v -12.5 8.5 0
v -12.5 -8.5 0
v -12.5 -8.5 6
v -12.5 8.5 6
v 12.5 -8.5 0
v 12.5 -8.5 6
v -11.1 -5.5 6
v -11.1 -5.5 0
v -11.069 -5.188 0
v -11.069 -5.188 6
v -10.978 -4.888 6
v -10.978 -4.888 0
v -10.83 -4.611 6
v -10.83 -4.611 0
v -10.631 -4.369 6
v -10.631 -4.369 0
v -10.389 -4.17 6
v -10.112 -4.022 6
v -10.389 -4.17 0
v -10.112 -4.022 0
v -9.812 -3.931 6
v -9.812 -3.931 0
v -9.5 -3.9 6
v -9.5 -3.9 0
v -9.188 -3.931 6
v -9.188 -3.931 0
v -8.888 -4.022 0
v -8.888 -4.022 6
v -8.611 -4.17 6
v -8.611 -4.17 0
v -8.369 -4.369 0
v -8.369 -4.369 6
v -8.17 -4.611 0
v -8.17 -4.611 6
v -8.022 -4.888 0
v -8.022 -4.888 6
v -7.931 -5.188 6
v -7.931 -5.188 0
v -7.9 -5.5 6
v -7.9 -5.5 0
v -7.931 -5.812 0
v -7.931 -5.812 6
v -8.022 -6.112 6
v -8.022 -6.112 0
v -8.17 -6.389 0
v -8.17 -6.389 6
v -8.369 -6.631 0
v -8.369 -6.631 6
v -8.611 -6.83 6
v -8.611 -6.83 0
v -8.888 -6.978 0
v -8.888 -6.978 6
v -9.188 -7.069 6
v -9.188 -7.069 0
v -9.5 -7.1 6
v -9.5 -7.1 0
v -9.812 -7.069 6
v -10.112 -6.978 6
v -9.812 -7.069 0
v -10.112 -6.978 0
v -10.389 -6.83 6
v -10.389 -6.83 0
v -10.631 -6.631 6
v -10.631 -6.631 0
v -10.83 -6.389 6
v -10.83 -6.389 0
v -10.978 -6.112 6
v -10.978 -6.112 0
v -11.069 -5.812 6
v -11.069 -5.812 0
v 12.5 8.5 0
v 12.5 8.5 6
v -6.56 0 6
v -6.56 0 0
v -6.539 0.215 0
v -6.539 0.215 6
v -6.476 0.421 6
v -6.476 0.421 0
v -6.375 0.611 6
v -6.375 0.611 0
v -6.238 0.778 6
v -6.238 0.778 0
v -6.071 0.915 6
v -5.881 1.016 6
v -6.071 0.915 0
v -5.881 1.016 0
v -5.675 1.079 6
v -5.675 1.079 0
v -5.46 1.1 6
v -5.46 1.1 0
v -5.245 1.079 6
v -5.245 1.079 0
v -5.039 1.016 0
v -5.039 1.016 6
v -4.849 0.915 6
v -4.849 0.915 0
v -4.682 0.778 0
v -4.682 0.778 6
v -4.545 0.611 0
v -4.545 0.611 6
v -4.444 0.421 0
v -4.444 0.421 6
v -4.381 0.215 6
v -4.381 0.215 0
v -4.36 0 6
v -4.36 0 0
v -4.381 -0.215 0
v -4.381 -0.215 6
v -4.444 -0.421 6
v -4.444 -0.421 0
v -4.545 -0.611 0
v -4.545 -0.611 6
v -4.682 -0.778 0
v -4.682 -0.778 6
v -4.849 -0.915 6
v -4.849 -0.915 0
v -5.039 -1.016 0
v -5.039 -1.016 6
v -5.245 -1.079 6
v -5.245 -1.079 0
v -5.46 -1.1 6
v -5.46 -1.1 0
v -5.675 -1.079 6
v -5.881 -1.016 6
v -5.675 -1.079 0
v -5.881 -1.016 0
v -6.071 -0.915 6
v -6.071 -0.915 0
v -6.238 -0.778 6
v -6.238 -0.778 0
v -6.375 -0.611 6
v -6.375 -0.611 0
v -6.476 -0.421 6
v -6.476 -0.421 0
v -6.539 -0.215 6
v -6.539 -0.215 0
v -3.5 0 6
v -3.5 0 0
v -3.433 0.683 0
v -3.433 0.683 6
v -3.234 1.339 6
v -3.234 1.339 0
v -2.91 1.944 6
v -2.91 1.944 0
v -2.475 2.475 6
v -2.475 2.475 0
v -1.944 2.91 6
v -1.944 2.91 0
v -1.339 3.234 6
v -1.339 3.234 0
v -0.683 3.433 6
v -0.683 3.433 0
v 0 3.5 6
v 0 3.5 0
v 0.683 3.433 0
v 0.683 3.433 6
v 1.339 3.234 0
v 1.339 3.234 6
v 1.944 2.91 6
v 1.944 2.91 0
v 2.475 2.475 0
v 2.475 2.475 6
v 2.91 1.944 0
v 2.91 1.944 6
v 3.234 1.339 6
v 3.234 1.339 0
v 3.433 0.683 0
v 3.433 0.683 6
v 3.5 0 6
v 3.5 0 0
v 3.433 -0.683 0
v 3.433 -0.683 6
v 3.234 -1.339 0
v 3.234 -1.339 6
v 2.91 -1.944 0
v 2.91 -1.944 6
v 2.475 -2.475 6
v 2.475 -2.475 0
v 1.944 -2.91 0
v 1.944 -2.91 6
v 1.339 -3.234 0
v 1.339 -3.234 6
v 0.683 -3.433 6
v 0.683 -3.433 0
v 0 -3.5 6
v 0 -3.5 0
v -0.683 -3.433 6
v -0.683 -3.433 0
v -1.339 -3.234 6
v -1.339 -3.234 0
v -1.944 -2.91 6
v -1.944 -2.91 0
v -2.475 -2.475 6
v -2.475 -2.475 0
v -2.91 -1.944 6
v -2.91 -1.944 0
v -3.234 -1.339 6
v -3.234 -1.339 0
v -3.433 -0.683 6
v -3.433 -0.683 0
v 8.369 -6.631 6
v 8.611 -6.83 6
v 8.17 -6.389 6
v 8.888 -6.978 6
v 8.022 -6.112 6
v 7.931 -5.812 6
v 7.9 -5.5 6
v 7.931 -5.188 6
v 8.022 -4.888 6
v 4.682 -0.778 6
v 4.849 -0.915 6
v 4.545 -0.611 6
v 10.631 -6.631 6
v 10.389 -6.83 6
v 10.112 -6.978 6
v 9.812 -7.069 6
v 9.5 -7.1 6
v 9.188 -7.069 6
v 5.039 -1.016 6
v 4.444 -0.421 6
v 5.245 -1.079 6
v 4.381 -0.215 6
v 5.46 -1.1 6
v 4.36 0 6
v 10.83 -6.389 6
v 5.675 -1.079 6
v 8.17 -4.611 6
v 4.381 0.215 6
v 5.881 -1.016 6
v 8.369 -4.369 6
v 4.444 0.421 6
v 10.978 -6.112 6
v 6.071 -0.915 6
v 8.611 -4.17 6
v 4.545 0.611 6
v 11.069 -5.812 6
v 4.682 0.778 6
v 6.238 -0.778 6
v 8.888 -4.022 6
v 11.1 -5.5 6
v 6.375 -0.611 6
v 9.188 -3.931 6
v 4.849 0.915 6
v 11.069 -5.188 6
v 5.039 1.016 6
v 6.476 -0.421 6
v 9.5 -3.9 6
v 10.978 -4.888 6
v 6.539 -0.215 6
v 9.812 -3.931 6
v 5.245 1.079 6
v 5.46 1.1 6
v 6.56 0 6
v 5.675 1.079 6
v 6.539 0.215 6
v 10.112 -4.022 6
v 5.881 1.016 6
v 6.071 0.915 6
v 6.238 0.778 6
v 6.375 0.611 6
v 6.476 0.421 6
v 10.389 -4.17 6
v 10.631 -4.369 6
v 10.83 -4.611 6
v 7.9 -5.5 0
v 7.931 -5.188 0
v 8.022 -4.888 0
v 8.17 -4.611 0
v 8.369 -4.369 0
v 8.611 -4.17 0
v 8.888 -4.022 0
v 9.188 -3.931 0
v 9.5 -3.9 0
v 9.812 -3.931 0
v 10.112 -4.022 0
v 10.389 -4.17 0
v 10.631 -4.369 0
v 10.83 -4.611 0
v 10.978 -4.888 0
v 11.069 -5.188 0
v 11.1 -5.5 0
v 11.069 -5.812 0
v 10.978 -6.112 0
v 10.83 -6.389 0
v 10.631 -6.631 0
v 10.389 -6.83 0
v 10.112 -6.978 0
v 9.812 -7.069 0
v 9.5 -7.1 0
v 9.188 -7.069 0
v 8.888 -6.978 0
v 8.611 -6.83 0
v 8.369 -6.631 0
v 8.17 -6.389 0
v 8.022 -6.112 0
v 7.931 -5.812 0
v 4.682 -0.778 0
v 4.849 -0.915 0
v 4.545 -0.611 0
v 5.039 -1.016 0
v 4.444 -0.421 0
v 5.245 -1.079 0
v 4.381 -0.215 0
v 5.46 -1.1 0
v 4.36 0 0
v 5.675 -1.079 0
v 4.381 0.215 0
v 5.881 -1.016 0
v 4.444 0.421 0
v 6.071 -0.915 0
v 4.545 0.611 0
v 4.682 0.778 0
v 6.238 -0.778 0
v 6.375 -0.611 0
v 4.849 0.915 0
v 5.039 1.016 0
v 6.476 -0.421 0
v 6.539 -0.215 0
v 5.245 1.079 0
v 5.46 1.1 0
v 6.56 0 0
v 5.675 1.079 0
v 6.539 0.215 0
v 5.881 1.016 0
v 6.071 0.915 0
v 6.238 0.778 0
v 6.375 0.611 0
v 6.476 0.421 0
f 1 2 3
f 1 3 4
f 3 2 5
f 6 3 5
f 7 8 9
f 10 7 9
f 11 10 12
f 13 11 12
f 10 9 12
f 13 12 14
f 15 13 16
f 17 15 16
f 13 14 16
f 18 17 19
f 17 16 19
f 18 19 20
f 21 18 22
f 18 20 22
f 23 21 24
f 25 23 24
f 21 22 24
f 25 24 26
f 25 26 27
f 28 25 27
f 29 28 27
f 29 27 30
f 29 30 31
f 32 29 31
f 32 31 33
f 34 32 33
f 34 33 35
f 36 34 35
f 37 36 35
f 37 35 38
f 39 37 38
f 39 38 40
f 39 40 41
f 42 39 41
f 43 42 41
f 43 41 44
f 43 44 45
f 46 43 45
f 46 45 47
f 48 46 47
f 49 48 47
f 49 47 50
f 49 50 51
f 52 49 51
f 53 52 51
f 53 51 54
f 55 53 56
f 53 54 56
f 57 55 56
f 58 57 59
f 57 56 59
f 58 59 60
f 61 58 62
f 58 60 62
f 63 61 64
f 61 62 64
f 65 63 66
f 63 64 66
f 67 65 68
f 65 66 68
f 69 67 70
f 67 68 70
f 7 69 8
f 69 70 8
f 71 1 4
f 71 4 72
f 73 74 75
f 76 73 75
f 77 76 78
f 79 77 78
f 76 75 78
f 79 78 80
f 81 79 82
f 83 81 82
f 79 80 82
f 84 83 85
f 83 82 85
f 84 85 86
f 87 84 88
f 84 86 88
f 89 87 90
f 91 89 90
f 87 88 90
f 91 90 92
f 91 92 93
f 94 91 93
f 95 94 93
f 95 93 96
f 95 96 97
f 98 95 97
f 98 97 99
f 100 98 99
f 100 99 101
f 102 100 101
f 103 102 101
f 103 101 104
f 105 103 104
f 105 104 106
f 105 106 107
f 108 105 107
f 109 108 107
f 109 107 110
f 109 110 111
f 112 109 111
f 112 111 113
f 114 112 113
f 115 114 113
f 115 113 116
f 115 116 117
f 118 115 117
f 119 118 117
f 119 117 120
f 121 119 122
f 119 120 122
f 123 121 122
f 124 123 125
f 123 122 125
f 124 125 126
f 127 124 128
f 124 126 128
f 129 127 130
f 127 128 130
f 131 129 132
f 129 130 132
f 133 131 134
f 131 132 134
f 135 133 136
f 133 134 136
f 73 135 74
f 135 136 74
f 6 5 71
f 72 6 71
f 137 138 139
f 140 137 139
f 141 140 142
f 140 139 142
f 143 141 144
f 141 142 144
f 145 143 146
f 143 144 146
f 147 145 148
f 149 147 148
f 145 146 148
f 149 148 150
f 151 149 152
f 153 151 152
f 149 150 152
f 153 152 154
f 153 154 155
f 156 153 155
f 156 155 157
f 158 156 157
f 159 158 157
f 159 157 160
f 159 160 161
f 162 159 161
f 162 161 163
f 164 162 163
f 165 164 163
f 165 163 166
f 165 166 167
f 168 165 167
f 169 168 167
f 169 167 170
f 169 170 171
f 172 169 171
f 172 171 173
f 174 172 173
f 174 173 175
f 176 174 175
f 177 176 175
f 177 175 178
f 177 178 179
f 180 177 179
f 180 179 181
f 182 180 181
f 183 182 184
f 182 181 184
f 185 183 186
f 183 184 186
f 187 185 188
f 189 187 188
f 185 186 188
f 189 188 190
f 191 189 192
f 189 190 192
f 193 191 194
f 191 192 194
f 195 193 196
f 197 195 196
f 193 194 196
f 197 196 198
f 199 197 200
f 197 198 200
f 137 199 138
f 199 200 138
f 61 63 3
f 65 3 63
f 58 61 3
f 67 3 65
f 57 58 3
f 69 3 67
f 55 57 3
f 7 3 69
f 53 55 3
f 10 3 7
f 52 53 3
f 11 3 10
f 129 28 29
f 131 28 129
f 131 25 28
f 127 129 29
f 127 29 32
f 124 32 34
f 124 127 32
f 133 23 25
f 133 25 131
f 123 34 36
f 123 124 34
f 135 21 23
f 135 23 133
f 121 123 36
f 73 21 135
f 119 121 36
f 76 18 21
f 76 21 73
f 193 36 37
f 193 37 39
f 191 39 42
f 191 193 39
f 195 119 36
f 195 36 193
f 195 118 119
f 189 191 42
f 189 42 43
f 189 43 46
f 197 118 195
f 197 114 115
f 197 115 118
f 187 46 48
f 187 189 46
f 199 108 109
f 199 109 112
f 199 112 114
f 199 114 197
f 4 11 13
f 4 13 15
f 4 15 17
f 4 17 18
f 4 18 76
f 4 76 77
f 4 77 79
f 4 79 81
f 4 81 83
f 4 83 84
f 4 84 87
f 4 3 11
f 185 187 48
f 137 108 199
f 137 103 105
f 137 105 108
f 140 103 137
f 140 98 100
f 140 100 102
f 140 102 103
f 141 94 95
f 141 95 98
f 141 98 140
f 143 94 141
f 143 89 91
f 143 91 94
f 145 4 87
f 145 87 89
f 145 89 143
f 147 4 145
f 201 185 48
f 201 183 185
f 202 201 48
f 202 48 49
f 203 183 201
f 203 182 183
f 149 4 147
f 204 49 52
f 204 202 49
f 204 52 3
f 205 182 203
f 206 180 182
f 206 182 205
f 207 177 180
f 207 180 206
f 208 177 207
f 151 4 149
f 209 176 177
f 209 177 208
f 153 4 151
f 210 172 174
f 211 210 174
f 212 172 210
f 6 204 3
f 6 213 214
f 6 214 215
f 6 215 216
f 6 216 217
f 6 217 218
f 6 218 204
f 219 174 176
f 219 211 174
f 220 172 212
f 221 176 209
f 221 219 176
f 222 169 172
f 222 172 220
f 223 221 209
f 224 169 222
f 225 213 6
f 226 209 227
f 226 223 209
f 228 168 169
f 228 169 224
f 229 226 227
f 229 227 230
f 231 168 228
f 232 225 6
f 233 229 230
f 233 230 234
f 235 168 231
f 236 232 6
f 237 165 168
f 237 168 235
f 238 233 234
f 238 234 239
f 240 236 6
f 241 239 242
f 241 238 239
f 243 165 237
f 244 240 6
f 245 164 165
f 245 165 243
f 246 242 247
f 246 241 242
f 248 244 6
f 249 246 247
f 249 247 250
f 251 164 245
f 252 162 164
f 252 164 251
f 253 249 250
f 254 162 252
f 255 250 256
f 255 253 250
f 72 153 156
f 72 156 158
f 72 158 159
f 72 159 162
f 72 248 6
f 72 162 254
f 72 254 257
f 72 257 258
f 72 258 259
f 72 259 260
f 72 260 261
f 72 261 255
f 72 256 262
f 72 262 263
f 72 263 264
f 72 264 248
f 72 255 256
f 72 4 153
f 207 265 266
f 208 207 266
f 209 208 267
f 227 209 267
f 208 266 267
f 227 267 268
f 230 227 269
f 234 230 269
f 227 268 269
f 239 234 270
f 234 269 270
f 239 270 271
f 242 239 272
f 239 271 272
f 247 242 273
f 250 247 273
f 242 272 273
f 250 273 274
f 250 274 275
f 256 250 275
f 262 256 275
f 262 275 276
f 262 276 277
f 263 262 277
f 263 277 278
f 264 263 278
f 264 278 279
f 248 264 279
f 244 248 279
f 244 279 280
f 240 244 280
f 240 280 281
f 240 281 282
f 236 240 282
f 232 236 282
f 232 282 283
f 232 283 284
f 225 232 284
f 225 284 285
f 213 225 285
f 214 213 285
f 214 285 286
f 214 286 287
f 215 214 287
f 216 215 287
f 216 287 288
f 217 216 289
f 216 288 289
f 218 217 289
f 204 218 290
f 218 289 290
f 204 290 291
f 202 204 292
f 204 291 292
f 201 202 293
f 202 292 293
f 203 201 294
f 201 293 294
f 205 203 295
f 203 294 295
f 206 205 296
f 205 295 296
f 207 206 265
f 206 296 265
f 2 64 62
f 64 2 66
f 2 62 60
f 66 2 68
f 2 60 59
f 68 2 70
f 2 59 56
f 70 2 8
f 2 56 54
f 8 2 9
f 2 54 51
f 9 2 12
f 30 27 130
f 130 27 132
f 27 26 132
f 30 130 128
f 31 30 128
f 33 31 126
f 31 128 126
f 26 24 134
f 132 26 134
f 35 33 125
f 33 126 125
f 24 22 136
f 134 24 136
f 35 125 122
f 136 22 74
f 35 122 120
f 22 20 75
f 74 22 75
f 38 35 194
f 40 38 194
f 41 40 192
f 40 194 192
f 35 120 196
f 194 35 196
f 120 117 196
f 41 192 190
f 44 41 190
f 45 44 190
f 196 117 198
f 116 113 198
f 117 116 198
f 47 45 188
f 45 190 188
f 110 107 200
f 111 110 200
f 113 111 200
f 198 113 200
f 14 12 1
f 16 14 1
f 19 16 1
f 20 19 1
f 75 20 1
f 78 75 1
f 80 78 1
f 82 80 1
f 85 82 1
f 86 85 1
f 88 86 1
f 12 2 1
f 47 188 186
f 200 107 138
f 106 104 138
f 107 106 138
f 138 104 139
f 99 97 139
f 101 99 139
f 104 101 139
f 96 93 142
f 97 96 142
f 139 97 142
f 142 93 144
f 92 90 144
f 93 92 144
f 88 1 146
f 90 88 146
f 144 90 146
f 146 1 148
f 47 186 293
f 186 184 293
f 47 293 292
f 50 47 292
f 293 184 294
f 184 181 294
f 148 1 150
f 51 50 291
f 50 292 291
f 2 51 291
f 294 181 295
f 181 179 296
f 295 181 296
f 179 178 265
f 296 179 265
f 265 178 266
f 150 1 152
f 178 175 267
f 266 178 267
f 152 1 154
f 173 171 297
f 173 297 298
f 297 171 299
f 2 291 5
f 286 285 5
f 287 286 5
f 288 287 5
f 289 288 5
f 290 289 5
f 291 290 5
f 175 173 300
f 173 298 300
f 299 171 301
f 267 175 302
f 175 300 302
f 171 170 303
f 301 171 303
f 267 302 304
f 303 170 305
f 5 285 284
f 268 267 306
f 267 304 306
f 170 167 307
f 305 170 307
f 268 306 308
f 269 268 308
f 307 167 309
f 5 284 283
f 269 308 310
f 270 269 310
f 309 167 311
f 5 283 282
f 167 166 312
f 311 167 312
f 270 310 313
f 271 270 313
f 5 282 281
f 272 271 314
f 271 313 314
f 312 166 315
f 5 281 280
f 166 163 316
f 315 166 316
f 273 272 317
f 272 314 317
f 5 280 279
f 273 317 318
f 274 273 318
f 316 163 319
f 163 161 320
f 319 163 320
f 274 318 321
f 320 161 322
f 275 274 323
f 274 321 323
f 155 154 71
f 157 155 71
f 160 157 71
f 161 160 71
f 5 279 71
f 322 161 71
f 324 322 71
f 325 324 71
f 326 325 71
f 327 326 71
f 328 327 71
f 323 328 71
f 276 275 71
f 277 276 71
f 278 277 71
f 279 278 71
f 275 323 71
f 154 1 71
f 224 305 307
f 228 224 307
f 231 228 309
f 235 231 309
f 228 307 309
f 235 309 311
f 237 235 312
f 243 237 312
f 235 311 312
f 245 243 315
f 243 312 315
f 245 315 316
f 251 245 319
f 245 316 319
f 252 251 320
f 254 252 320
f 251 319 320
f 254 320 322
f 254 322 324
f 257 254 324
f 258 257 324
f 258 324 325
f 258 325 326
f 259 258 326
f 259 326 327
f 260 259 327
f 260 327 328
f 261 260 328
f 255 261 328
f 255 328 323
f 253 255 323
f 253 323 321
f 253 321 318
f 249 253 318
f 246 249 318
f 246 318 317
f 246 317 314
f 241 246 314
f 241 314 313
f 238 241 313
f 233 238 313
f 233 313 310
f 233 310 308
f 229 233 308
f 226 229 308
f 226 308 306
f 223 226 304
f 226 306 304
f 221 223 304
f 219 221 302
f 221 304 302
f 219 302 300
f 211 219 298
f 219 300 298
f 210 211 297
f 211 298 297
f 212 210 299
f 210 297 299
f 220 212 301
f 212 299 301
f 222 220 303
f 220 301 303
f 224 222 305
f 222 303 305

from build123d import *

# Parameters (mm, degrees)
SKIZZE1_W                        = 25
SKIZZE1_H                        = 17
AUFSATZ_LINEAR_AUSTRAGEN1_DEPTH  = 6
F_3_2_3_2_DURCHMESSER_BOHRUNG1_D = 3.2
F_7_0_7_DURCHMESSER_BOHRUNG1_D   = 7
F_2_2_2_2_DURCHMESSER_BOHRUNG1_D = 2.2


with BuildPart() as part:
    # Skizze1 → Aufsatz-Linear austragen1 (new body)
    with BuildSketch(Plane.XY):
        Rectangle(SKIZZE1_W, SKIZZE1_H)
    extrude(amount=AUFSATZ_LINEAR_AUSTRAGEN1_DEPTH)

    # Ø3.2 (3.2) Durchmesser Bohrung1 (through all)
    with Locations(Plane.XY.offset(6)):
        with Locations((-9.5, -5.5), (9.5, -5.5)):
            Hole(F_3_2_3_2_DURCHMESSER_BOHRUNG1_D / 2)

    # Ø7.0 (7) Durchmesser Bohrung1 (through all)
    with Locations(Plane.XY.offset(6)):
        with Locations((0, 0)):
            Hole(F_7_0_7_DURCHMESSER_BOHRUNG1_D / 2)

    # Ø2.2 (2.2) Durchmesser Bohrung1 (through all)
    with Locations(Plane.XY.offset(6)):
        with Locations((-5.46, 0), (5.46, 0)):
            Hole(F_2_2_2_2_DURCHMESSER_BOHRUNG1_D / 2)


solid = part.part
